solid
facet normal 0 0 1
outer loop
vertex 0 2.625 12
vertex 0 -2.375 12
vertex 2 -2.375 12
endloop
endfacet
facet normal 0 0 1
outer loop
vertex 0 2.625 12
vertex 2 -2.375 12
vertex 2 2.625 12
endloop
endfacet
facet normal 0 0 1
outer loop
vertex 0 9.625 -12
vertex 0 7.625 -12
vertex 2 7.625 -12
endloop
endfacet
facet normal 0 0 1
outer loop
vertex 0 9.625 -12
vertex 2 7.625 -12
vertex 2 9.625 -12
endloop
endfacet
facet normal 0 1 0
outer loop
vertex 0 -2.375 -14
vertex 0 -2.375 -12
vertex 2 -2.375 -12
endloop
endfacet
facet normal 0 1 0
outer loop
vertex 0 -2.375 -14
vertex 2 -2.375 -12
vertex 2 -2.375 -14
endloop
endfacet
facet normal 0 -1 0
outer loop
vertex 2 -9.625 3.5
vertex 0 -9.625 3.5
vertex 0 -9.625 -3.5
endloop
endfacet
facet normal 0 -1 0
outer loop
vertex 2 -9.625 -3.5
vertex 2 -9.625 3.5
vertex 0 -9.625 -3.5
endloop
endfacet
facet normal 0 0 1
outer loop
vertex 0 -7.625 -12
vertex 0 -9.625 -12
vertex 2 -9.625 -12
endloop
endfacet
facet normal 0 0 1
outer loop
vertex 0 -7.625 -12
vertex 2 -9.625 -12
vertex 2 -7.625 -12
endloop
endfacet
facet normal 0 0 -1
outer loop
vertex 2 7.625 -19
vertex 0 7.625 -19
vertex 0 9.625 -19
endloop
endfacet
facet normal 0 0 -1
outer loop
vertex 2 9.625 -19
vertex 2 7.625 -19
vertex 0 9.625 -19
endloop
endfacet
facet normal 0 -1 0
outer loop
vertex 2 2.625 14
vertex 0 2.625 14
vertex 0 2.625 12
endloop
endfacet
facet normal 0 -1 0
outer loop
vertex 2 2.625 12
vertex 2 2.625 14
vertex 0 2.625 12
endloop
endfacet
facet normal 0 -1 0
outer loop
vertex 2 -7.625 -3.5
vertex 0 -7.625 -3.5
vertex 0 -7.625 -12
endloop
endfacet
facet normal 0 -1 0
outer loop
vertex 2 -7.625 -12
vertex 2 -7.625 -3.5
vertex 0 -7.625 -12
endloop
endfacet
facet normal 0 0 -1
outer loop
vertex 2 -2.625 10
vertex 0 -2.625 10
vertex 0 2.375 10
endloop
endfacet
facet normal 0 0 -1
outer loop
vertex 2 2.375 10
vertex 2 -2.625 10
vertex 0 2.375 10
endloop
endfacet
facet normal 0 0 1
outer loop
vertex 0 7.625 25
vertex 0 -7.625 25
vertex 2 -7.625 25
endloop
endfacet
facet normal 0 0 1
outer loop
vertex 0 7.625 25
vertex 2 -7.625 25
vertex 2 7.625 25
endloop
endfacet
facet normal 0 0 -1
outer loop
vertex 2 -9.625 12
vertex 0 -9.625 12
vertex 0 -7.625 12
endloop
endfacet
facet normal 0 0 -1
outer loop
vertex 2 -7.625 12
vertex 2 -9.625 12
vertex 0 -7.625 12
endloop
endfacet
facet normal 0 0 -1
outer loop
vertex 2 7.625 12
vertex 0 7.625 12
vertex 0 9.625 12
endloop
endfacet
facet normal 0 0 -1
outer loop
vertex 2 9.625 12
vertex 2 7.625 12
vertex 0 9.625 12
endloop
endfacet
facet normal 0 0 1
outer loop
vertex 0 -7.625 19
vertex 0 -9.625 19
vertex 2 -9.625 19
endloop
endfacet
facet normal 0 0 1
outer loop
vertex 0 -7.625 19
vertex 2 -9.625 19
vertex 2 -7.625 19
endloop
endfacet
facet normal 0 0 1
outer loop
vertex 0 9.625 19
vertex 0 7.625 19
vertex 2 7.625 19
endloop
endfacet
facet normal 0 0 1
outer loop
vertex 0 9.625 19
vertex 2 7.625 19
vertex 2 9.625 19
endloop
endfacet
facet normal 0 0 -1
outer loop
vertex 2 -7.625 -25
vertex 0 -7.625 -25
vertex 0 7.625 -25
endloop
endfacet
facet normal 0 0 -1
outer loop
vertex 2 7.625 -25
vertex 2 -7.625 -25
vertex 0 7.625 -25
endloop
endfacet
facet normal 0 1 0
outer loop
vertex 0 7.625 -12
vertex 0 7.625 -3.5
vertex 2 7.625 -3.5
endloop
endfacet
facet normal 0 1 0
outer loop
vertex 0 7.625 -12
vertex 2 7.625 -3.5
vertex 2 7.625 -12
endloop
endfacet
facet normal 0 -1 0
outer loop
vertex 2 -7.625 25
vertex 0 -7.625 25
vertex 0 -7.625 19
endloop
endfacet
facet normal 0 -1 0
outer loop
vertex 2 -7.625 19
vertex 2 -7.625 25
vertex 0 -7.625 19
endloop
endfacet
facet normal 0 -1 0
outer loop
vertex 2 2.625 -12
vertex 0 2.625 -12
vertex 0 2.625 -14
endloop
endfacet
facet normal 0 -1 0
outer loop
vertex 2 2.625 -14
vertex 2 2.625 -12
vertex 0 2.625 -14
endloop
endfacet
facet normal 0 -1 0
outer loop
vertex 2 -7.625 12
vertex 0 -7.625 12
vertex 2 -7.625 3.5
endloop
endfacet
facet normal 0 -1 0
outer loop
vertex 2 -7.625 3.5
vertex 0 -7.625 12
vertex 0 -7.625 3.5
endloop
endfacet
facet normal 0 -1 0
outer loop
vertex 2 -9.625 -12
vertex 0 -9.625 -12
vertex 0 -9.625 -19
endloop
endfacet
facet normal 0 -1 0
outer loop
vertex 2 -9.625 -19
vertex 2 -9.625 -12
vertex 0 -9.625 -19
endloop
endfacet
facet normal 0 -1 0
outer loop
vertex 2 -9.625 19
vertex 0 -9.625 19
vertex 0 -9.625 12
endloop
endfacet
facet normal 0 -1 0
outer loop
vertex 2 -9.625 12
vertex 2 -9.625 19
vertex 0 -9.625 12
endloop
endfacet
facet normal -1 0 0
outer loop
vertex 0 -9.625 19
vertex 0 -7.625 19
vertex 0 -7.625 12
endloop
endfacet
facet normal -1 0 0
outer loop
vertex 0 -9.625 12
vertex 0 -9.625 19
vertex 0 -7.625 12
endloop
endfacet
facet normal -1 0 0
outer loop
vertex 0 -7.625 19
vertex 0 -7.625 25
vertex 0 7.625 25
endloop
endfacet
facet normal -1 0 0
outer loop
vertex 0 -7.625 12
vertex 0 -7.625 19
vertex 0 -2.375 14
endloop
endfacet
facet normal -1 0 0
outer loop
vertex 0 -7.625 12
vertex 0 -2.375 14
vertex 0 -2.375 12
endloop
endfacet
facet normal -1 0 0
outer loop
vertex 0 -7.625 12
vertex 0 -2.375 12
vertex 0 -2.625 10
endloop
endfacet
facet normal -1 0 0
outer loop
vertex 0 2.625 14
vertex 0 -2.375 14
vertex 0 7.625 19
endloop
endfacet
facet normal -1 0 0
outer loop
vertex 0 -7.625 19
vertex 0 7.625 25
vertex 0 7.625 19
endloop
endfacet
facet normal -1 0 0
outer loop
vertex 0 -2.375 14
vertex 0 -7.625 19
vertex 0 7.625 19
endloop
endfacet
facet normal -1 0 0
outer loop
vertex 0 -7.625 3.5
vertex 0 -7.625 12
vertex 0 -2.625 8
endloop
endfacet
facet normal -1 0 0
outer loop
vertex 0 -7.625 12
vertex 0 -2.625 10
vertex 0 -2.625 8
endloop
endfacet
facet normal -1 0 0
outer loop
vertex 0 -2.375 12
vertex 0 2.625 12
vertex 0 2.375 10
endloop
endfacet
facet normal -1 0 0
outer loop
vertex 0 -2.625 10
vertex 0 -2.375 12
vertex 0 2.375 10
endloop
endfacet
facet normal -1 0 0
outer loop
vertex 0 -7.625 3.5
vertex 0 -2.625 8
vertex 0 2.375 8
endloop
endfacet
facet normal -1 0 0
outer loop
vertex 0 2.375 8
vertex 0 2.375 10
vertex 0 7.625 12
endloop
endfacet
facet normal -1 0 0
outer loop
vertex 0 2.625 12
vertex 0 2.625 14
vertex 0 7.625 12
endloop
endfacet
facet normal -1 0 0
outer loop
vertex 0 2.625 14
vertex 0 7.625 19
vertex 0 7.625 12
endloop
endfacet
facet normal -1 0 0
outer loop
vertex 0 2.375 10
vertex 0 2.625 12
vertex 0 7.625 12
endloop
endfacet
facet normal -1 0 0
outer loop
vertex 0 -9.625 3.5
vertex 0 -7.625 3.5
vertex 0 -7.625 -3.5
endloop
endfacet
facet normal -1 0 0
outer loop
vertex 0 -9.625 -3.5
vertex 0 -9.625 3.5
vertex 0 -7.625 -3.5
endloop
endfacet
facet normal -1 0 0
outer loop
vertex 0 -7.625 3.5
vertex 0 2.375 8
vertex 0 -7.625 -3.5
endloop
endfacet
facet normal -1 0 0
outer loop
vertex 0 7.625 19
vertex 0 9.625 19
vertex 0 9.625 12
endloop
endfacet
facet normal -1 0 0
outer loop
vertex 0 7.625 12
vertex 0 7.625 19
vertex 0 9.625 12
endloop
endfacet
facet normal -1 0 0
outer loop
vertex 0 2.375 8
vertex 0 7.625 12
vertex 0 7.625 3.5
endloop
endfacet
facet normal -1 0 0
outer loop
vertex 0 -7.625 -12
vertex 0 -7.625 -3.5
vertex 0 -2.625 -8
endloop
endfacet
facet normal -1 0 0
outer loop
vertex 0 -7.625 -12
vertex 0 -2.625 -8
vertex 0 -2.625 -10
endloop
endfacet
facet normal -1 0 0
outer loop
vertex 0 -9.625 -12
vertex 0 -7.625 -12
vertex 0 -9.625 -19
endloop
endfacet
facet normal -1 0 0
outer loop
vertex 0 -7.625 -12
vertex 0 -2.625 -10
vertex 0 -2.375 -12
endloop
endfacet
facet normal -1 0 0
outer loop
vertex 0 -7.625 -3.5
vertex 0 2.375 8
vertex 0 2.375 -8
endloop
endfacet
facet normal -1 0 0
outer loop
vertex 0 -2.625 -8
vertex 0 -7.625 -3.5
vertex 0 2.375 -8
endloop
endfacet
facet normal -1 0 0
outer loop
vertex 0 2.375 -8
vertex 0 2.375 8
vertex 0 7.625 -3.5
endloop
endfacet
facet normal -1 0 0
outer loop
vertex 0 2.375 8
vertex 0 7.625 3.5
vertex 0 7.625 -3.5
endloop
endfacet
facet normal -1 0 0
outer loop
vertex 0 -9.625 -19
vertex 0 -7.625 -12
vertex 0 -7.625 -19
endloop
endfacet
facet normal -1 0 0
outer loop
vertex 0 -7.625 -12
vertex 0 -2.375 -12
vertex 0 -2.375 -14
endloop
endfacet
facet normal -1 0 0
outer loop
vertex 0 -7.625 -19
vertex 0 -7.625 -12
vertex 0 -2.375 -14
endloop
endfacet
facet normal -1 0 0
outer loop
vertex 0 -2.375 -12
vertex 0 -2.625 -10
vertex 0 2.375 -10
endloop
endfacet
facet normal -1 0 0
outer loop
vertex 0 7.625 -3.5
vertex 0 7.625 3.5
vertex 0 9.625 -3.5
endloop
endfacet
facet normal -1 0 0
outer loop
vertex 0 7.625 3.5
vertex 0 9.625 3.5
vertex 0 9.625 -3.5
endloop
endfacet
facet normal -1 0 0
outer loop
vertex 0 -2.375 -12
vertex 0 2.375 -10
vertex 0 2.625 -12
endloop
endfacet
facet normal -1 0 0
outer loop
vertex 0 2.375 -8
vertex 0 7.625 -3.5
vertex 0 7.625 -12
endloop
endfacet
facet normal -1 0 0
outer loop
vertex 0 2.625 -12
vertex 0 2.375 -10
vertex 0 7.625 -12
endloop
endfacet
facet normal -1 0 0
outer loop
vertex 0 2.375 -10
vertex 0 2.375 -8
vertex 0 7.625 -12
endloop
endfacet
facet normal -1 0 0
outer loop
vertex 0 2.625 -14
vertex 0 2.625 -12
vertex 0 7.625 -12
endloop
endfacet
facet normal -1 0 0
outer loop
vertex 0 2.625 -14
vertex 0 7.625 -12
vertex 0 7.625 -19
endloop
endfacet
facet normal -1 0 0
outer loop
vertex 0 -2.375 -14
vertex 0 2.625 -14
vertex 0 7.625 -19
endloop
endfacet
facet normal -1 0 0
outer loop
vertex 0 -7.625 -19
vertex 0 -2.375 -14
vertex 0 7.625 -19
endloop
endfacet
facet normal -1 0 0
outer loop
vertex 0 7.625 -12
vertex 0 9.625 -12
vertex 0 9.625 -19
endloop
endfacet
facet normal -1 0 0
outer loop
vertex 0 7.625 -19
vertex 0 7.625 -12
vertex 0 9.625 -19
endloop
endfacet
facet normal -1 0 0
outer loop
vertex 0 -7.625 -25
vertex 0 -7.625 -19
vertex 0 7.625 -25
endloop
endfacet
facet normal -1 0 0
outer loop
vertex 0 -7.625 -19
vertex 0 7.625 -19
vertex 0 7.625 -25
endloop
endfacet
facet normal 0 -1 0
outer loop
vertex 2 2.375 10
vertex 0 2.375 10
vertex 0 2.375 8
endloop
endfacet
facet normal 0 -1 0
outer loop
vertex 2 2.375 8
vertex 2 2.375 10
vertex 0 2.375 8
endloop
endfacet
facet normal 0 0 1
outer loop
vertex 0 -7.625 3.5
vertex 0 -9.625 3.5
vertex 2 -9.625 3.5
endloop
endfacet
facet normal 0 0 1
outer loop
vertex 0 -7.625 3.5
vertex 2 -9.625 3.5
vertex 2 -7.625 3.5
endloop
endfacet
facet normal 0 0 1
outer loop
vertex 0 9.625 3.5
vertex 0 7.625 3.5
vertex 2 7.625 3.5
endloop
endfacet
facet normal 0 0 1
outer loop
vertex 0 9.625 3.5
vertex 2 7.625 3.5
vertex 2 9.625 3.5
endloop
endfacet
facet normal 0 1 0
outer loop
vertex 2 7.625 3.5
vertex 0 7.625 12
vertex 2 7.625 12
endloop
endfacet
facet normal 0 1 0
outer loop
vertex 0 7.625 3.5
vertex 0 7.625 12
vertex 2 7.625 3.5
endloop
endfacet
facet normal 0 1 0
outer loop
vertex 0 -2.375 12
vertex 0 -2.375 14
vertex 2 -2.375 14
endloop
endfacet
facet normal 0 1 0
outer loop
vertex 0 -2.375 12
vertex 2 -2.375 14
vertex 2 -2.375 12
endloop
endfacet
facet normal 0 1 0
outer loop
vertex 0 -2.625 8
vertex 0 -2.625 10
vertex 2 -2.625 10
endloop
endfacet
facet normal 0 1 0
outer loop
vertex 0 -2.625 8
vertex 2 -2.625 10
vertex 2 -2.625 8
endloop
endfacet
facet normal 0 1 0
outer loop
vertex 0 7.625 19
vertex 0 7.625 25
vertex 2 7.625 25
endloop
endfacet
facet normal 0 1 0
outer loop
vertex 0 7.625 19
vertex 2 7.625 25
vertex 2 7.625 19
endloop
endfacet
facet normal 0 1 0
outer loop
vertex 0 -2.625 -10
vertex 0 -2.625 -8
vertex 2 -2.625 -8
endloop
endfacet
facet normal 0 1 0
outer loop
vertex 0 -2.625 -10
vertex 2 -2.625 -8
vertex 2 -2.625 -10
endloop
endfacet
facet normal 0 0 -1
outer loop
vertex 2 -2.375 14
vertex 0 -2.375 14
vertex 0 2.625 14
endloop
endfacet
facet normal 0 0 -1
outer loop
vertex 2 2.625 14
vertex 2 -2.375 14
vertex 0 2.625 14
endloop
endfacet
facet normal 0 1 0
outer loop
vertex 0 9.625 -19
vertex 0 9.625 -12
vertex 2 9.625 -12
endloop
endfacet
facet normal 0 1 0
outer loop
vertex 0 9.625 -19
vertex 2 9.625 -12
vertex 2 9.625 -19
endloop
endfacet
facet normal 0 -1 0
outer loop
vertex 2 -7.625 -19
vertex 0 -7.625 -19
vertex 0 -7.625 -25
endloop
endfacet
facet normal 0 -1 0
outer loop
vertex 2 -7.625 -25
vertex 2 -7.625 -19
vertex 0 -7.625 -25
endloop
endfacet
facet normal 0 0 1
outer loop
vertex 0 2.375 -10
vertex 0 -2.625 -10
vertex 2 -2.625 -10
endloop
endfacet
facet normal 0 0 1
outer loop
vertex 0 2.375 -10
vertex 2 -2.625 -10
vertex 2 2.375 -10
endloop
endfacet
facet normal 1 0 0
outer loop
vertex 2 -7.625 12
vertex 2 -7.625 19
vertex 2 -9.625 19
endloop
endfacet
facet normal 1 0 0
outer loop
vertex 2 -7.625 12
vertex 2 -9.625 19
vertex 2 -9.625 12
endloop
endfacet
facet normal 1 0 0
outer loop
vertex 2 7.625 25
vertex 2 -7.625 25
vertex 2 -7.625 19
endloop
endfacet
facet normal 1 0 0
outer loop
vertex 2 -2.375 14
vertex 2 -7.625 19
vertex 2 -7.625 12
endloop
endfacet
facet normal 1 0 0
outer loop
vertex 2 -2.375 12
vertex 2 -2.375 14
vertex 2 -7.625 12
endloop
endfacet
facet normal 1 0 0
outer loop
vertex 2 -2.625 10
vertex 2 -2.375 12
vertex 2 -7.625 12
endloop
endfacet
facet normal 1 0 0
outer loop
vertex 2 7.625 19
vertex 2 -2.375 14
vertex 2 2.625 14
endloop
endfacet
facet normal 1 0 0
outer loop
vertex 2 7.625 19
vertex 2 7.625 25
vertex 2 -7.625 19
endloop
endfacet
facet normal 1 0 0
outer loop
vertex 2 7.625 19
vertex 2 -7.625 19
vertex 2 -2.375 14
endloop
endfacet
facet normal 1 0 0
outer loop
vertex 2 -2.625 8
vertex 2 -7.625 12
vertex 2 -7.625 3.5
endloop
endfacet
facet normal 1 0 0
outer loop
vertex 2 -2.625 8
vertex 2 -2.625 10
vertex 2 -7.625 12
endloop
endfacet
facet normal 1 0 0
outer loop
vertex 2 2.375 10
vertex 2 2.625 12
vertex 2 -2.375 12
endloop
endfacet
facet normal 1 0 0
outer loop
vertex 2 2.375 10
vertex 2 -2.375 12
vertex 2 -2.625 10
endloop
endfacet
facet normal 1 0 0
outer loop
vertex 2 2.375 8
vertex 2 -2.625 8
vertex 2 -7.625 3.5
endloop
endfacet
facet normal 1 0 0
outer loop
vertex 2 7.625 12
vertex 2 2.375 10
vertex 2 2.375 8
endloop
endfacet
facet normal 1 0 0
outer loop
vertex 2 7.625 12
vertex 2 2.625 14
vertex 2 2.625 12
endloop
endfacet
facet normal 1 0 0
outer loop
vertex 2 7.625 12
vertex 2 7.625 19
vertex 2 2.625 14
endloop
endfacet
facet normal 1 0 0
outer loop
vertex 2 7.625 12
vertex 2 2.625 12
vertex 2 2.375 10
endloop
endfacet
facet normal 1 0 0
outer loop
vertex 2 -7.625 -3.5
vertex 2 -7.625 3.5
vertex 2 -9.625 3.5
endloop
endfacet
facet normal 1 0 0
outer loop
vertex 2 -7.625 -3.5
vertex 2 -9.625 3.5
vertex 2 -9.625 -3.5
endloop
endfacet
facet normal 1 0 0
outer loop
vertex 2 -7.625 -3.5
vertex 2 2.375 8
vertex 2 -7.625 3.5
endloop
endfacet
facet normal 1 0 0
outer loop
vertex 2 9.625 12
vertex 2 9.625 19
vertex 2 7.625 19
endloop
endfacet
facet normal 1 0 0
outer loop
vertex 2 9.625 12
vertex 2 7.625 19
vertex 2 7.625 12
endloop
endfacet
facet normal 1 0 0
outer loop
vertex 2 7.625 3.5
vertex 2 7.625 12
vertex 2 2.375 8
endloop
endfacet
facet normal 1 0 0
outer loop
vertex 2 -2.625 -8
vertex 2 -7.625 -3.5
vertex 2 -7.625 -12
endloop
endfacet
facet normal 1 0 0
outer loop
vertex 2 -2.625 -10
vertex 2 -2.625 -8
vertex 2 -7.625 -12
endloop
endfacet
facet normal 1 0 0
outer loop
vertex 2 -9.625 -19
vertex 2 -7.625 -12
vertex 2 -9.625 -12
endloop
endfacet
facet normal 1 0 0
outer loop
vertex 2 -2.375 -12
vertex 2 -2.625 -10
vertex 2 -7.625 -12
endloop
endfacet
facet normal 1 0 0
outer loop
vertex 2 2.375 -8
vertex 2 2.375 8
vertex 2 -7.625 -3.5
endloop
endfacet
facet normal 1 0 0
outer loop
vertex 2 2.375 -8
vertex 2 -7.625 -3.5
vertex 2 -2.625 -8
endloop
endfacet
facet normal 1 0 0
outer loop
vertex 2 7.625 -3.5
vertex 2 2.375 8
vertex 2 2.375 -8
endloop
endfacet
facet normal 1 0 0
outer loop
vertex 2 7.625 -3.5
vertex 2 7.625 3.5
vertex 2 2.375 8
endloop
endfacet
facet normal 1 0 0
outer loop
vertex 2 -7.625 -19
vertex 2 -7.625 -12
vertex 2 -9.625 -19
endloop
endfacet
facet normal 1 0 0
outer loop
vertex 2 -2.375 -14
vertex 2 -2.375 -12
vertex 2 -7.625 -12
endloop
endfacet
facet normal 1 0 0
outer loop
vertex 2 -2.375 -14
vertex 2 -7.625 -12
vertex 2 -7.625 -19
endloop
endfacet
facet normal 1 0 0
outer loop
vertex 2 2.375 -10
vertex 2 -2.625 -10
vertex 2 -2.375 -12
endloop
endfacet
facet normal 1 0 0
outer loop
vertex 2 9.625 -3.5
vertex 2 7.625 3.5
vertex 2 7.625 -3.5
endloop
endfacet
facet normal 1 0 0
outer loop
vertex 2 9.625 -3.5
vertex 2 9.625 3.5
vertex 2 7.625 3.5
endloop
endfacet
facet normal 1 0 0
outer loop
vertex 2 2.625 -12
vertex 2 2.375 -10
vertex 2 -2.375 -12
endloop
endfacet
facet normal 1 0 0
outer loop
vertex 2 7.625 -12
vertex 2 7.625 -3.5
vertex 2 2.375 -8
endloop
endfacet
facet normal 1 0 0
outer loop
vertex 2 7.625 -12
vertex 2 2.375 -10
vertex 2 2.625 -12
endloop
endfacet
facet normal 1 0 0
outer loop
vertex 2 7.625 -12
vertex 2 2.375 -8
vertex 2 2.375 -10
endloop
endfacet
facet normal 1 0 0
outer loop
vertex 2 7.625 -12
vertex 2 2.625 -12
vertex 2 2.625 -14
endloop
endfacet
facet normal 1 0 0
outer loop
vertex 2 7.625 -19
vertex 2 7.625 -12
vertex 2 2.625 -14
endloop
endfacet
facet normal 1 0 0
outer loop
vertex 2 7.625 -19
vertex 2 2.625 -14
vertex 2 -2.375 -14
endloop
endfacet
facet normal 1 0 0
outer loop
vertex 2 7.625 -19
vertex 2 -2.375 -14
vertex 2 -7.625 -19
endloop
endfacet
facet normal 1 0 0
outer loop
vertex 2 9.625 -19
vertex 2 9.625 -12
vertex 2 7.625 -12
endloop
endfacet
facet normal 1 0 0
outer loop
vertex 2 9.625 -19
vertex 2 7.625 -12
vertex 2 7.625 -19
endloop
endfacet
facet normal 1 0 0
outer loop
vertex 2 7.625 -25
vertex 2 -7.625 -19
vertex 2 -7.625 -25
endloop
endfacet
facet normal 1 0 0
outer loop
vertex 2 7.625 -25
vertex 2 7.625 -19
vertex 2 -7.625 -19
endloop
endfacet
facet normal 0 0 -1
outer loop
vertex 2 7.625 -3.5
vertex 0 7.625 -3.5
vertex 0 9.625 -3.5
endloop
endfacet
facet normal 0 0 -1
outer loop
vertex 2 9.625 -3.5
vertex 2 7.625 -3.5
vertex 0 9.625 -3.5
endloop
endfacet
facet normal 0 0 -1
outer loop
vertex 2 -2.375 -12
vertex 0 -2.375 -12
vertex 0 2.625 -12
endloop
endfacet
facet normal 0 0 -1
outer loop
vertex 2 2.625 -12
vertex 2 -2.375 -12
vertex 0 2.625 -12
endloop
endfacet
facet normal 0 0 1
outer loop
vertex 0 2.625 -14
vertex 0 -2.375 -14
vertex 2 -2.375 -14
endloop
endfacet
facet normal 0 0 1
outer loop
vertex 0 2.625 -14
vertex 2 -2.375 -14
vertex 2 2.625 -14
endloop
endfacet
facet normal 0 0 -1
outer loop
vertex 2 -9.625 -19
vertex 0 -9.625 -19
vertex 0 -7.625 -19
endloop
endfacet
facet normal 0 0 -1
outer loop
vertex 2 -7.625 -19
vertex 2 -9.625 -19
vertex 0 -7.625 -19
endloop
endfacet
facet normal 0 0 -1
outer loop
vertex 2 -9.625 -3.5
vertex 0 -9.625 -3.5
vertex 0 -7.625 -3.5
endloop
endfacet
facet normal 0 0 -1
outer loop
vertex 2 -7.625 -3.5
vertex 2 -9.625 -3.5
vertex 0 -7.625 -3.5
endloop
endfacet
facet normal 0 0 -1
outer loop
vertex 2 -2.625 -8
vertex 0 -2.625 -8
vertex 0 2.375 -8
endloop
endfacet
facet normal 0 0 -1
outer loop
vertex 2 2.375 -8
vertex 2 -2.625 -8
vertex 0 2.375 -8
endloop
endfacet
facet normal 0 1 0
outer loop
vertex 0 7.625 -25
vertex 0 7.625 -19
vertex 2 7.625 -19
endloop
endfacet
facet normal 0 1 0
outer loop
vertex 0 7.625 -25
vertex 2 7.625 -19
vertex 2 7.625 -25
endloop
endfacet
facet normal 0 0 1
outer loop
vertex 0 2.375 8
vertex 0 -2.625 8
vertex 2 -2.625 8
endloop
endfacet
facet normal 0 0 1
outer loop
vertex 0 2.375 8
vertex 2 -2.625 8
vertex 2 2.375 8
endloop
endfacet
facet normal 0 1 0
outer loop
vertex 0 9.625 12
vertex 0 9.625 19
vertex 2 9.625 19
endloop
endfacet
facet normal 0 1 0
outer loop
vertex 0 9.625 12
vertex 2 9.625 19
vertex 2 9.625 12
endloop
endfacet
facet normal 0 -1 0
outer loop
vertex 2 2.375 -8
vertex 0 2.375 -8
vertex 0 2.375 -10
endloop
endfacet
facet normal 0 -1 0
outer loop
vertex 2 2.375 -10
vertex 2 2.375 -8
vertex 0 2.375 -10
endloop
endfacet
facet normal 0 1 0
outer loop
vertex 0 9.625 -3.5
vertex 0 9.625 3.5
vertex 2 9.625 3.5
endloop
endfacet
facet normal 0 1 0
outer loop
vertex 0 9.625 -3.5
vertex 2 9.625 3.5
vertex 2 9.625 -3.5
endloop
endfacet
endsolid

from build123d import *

# Parameters (mm, degrees)
SKETCH1_W           = 50
SKETCH1_H           = 15.25
SKETCH1_W_2         = 2
SKETCH1_H_2         = 5
SKETCH1_W_3         = 7
SKETCH1_H_3         = 2
BOSS_EXTRUDE1_DEPTH = 2


with BuildPart() as part:
    # Sketch1 → Boss-Extrude1 (new body)
    # profile 1 of 7: a face of its own
    with BuildSketch(Plane(origin=(0, 0, 0), x_dir=(0, 0, -1), z_dir=(1, 0, 0))):
        Rectangle(SKETCH1_W, SKETCH1_H)
        with Locations((-9, -0.125)):
            Rectangle(SKETCH1_W_2, SKETCH1_H_2, mode=Mode.SUBTRACT)
        with Locations((9, -0.125)):
            Rectangle(SKETCH1_W_2, SKETCH1_H_2, mode=Mode.SUBTRACT)
        with Locations((-13, 0.125)):
            Rectangle(SKETCH1_W_2, SKETCH1_H_2, mode=Mode.SUBTRACT)
        with Locations((13, 0.125)):
            Rectangle(SKETCH1_W_2, SKETCH1_H_2, mode=Mode.SUBTRACT)
    # profile 2 of 7: a face of its own
    with BuildSketch(Plane(origin=(0, 0, 0), x_dir=(0, 0, -1), z_dir=(1, 0, 0))):
        with Locations((-15.5, -8.625)):
            Rectangle(SKETCH1_W_3, SKETCH1_H_3)
    # profile 3 of 7: a face of its own
    with BuildSketch(Plane(origin=(0, 0, 0), x_dir=(0, 0, -1), z_dir=(1, 0, 0))):
        with Locations((0, -8.625)):
            Rectangle(SKETCH1_W_3, SKETCH1_H_3)
    # profile 4 of 7: a face of its own
    with BuildSketch(Plane(origin=(0, 0, 0), x_dir=(0, 0, -1), z_dir=(1, 0, 0))):
        with Locations((15.5, -8.625)):
            Rectangle(SKETCH1_W_3, SKETCH1_H_3)
    # profile 5 of 7: a face of its own
    with BuildSketch(Plane(origin=(0, 0, 0), x_dir=(0, 0, -1), z_dir=(1, 0, 0))):
        with Locations((-15.5, 8.625)):
            Rectangle(SKETCH1_W_3, SKETCH1_H_3)
    # profile 6 of 7: a face of its own
    with BuildSketch(Plane(origin=(0, 0, 0), x_dir=(0, 0, -1), z_dir=(1, 0, 0))):
        with Locations((0, 8.625)):
            Rectangle(SKETCH1_W_3, SKETCH1_H_3)
    # profile 7 of 7: a face of its own
    with BuildSketch(Plane(origin=(0, 0, 0), x_dir=(0, 0, -1), z_dir=(1, 0, 0))):
        with Locations((15.5, 8.625)):
            Rectangle(SKETCH1_W_3, SKETCH1_H_3)
    extrude(amount=BOSS_EXTRUDE1_DEPTH)


solid = part.part
